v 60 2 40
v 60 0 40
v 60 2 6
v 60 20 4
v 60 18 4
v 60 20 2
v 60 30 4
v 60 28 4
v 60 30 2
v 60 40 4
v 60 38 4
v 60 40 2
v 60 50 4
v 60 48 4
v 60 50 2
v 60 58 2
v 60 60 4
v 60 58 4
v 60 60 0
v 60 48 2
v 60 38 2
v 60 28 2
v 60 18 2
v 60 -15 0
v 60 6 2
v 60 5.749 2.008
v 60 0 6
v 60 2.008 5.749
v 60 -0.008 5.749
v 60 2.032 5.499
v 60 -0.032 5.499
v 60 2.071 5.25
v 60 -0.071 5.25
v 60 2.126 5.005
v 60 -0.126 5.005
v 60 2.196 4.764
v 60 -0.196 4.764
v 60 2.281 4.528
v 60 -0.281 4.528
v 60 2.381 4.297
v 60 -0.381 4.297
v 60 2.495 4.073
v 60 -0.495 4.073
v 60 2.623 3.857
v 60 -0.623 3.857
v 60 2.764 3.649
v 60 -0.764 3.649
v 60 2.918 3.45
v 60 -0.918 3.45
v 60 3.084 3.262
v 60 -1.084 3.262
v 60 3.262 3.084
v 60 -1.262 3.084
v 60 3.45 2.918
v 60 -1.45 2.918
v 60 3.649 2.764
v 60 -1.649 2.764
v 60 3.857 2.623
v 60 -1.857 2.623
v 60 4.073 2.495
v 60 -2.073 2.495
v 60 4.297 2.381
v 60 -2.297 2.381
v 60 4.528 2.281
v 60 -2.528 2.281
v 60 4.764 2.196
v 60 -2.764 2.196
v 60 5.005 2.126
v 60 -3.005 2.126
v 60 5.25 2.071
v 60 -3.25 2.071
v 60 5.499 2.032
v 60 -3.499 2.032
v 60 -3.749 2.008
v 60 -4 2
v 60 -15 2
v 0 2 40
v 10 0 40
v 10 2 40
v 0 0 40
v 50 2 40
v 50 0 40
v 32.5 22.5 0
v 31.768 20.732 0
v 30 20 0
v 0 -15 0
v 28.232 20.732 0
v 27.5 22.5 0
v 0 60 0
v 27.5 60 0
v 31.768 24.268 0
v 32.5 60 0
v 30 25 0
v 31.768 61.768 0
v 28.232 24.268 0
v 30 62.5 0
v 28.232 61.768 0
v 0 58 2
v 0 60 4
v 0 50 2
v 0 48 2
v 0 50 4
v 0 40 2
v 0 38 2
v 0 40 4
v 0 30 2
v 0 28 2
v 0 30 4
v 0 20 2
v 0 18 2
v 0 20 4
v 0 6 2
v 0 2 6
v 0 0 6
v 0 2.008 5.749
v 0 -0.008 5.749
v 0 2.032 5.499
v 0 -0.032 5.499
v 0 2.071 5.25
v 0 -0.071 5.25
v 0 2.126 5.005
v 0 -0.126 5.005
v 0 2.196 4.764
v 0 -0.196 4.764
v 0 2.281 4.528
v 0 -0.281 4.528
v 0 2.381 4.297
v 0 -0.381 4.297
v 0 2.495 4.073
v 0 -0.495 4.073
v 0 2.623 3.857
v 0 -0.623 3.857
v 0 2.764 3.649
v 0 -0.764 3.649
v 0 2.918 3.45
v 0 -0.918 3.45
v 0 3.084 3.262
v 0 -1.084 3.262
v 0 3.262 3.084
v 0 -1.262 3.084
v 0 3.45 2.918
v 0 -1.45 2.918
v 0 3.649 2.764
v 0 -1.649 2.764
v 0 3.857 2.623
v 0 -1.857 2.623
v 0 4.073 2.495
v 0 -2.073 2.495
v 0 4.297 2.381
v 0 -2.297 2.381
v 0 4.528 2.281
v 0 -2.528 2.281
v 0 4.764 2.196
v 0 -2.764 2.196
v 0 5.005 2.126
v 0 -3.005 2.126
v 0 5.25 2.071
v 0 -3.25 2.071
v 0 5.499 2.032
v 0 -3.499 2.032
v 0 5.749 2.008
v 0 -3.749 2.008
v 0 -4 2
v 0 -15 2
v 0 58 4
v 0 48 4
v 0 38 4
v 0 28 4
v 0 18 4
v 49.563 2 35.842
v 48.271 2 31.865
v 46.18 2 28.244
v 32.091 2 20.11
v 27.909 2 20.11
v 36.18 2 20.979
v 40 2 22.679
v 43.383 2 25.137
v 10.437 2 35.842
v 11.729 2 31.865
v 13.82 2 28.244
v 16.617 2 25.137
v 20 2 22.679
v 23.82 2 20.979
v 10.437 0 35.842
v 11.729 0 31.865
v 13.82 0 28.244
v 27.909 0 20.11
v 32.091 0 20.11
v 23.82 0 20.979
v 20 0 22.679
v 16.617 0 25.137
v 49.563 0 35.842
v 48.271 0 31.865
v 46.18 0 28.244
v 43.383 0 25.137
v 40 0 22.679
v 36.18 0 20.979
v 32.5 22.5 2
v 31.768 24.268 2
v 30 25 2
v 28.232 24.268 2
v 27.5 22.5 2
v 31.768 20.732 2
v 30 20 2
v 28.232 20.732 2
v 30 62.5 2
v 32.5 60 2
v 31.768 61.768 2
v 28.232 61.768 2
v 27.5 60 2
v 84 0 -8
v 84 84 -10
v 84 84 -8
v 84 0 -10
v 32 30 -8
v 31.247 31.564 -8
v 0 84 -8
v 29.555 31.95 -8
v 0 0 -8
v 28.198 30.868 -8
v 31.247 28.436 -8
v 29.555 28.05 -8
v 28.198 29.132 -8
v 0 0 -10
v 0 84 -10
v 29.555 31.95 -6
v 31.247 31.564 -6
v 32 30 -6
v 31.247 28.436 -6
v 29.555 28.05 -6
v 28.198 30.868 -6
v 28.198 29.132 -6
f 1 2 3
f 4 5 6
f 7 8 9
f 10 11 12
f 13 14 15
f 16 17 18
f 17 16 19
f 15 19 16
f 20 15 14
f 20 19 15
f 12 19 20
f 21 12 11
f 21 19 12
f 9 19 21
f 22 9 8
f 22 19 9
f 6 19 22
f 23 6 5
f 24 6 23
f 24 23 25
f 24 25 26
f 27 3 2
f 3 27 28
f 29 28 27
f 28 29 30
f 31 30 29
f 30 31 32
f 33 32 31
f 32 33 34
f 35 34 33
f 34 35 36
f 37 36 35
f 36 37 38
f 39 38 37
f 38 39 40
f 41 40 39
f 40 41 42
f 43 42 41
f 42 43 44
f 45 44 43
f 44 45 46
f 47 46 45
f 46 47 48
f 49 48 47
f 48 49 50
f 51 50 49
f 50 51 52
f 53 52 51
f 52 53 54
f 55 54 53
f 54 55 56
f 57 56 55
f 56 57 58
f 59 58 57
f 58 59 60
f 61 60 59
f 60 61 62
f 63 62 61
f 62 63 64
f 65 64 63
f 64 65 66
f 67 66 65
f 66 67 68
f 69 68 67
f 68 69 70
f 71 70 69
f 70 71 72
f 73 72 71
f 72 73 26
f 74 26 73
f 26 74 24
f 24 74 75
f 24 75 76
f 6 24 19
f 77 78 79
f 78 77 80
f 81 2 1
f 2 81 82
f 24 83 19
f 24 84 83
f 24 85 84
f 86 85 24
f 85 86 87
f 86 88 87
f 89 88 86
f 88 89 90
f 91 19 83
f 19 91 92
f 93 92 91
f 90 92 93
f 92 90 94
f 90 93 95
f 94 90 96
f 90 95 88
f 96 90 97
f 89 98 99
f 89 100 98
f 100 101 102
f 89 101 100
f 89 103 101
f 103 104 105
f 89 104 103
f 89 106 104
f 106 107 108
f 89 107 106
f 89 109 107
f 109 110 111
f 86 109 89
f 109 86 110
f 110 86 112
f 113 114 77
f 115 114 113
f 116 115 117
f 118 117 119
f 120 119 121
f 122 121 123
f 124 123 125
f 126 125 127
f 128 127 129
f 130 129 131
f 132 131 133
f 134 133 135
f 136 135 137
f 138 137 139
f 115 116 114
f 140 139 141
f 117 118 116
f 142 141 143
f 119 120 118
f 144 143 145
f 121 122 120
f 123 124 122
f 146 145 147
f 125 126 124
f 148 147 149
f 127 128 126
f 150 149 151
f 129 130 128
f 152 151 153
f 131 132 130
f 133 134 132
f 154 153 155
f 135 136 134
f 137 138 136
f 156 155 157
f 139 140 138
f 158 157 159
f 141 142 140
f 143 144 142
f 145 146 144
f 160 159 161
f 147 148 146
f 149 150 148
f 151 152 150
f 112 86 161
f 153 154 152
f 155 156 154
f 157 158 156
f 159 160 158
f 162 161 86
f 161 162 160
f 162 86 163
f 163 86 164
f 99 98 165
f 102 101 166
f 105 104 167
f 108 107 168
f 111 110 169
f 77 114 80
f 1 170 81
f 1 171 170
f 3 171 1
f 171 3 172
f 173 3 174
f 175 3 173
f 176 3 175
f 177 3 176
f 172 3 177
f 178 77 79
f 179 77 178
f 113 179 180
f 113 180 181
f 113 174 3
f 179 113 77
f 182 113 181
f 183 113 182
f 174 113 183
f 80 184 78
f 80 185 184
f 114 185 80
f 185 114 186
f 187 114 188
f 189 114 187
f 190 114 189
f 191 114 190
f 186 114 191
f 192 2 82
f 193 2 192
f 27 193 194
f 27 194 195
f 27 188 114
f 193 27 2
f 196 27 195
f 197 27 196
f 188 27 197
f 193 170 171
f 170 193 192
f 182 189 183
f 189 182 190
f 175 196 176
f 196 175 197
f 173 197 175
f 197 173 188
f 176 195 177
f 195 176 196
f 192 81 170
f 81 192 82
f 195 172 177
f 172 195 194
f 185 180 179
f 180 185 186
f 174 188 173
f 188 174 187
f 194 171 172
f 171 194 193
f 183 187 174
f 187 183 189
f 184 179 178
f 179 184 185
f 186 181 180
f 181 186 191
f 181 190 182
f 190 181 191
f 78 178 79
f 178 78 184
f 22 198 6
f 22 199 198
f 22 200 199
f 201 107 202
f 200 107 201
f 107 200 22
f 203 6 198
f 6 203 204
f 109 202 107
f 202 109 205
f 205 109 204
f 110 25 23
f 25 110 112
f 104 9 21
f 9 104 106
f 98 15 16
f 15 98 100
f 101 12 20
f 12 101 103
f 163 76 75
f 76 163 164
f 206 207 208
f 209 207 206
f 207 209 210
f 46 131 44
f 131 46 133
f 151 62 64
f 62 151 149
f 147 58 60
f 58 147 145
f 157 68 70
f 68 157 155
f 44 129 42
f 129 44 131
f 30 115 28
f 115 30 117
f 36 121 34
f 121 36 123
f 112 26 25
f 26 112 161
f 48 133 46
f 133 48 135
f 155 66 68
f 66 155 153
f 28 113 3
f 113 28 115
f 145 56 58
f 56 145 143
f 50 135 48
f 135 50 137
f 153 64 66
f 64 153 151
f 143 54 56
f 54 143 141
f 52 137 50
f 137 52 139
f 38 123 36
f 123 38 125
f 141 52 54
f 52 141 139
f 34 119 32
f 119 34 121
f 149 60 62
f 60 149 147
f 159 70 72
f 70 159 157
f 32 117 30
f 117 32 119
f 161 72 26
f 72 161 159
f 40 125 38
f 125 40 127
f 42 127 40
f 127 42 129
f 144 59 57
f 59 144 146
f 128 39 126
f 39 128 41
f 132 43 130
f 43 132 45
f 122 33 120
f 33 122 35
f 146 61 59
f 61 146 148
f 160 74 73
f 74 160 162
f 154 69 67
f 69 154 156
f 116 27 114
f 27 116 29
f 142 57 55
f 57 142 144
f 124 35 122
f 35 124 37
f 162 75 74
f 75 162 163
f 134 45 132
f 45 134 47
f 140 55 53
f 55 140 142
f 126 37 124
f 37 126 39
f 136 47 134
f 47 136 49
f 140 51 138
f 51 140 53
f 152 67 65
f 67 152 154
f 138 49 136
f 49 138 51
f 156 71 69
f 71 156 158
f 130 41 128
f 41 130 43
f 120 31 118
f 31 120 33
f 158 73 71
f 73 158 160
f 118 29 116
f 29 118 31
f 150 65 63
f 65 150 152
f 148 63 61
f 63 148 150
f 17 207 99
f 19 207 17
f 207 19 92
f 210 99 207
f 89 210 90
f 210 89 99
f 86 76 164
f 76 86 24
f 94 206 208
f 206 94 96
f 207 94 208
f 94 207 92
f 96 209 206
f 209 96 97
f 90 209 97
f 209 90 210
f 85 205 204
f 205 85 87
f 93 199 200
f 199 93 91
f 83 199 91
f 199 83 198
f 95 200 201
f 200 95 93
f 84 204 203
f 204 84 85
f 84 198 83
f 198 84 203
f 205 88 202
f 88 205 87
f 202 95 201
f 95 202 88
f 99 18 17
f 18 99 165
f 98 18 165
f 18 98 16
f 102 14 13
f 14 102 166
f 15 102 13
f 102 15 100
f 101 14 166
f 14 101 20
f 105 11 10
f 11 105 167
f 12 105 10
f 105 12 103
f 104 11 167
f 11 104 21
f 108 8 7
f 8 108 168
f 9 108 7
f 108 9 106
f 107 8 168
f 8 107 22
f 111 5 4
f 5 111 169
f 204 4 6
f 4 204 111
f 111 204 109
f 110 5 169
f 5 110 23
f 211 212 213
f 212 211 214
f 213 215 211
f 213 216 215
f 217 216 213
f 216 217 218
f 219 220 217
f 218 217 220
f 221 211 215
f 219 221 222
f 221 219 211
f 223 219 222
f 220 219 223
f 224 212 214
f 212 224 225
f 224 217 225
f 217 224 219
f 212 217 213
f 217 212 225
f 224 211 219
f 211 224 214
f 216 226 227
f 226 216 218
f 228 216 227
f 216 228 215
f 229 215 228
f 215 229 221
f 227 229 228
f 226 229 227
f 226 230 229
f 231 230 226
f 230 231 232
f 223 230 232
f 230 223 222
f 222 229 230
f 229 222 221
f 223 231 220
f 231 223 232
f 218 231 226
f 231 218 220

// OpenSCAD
/* [Dimensions] */
// Base Length
LEN_BASE = 60; // [10:100] Base Length
// Base width
WIDTH = 60; // [10:100] Base width
// Thickness of Base and Back
THICK = 2; // [1:10] Thickness of Base and Back
// height of Back
HEIGHT = 40; // [10:80] height of Back
// Number of Steps
STEPS_NO = 5;// [2:8] Number of Steps
// Strength of Steps
STRENGTH = 2; // [1:10] Strength of Steps
// Space between Steps
STEPS_SPACE = 10;// [1:10] Space between Steps
// radius of curved corners
cornerRad = 3; // radius of curved corners

// -----------------------------
// Define Modules
// -----------------------------

module body(width, length, heigth, thickness){
cube([width,length,thickness]);//Base
difference() {
    cube([width,thickness,heigth]);//Back
    translate([width/2,0,heigth])rotate([90,0,0])cylinder(  10, d=40, center=true);};//Back-Cut-Out
rotate([0,0,90])translate([THICK,-width,thickness])
corner(heigth/10,width);//Front Corner Rounding
rotate([90,0,0])cube([width,thickness,15]);//Back Stabilizer
rotate([0,270,90])translate([thickness,-width,0])
corner(heigth/10,width);//Back Corner Rounding

translate([width/2,length,0])cylinder(  thickness, d=5);//Front Indicator

}

module base(width, length, thickness){
cube([1.4*width,1.4*length,thickness]);//Base
translate([width/2,length/2,0])cylinder(  thickness*2, d=4);
    
    }

module steps(number, strength, space, width){
    for (i = [0 : number-1]){
   translate([0,-(strength)-space*i,0])cube([width,strength,strength]);
    }
    }

module clock(number, strength, space, width){
    for (i = [0 : number-1]){
   rotate([0,20,0])cube([width,strength,strength]);
    }
    }

module corner(WIDTH,DEPTH){
difference() {
cube([WIDTH, DEPTH, WIDTH]);
rotate([270,0,0])translate([WIDTH,-WIDTH,0])cylinder(DEPTH, r=WIDTH, $fn=100);
}};

// -----------------------------
// Put Components together
// -----------------------------
difference() {
body(WIDTH,LEN_BASE,HEIGHT,THICK);
translate([WIDTH/2,(LEN_BASE-15)/2,THICK])cylinder(  20, d=5, center=true);}
translate([0,LEN_BASE,THICK])
steps(STEPS_NO,STRENGTH,STEPS_SPACE,WIDTH);
translate([0,0,-10])base(LEN_BASE,LEN_BASE,THICK);
